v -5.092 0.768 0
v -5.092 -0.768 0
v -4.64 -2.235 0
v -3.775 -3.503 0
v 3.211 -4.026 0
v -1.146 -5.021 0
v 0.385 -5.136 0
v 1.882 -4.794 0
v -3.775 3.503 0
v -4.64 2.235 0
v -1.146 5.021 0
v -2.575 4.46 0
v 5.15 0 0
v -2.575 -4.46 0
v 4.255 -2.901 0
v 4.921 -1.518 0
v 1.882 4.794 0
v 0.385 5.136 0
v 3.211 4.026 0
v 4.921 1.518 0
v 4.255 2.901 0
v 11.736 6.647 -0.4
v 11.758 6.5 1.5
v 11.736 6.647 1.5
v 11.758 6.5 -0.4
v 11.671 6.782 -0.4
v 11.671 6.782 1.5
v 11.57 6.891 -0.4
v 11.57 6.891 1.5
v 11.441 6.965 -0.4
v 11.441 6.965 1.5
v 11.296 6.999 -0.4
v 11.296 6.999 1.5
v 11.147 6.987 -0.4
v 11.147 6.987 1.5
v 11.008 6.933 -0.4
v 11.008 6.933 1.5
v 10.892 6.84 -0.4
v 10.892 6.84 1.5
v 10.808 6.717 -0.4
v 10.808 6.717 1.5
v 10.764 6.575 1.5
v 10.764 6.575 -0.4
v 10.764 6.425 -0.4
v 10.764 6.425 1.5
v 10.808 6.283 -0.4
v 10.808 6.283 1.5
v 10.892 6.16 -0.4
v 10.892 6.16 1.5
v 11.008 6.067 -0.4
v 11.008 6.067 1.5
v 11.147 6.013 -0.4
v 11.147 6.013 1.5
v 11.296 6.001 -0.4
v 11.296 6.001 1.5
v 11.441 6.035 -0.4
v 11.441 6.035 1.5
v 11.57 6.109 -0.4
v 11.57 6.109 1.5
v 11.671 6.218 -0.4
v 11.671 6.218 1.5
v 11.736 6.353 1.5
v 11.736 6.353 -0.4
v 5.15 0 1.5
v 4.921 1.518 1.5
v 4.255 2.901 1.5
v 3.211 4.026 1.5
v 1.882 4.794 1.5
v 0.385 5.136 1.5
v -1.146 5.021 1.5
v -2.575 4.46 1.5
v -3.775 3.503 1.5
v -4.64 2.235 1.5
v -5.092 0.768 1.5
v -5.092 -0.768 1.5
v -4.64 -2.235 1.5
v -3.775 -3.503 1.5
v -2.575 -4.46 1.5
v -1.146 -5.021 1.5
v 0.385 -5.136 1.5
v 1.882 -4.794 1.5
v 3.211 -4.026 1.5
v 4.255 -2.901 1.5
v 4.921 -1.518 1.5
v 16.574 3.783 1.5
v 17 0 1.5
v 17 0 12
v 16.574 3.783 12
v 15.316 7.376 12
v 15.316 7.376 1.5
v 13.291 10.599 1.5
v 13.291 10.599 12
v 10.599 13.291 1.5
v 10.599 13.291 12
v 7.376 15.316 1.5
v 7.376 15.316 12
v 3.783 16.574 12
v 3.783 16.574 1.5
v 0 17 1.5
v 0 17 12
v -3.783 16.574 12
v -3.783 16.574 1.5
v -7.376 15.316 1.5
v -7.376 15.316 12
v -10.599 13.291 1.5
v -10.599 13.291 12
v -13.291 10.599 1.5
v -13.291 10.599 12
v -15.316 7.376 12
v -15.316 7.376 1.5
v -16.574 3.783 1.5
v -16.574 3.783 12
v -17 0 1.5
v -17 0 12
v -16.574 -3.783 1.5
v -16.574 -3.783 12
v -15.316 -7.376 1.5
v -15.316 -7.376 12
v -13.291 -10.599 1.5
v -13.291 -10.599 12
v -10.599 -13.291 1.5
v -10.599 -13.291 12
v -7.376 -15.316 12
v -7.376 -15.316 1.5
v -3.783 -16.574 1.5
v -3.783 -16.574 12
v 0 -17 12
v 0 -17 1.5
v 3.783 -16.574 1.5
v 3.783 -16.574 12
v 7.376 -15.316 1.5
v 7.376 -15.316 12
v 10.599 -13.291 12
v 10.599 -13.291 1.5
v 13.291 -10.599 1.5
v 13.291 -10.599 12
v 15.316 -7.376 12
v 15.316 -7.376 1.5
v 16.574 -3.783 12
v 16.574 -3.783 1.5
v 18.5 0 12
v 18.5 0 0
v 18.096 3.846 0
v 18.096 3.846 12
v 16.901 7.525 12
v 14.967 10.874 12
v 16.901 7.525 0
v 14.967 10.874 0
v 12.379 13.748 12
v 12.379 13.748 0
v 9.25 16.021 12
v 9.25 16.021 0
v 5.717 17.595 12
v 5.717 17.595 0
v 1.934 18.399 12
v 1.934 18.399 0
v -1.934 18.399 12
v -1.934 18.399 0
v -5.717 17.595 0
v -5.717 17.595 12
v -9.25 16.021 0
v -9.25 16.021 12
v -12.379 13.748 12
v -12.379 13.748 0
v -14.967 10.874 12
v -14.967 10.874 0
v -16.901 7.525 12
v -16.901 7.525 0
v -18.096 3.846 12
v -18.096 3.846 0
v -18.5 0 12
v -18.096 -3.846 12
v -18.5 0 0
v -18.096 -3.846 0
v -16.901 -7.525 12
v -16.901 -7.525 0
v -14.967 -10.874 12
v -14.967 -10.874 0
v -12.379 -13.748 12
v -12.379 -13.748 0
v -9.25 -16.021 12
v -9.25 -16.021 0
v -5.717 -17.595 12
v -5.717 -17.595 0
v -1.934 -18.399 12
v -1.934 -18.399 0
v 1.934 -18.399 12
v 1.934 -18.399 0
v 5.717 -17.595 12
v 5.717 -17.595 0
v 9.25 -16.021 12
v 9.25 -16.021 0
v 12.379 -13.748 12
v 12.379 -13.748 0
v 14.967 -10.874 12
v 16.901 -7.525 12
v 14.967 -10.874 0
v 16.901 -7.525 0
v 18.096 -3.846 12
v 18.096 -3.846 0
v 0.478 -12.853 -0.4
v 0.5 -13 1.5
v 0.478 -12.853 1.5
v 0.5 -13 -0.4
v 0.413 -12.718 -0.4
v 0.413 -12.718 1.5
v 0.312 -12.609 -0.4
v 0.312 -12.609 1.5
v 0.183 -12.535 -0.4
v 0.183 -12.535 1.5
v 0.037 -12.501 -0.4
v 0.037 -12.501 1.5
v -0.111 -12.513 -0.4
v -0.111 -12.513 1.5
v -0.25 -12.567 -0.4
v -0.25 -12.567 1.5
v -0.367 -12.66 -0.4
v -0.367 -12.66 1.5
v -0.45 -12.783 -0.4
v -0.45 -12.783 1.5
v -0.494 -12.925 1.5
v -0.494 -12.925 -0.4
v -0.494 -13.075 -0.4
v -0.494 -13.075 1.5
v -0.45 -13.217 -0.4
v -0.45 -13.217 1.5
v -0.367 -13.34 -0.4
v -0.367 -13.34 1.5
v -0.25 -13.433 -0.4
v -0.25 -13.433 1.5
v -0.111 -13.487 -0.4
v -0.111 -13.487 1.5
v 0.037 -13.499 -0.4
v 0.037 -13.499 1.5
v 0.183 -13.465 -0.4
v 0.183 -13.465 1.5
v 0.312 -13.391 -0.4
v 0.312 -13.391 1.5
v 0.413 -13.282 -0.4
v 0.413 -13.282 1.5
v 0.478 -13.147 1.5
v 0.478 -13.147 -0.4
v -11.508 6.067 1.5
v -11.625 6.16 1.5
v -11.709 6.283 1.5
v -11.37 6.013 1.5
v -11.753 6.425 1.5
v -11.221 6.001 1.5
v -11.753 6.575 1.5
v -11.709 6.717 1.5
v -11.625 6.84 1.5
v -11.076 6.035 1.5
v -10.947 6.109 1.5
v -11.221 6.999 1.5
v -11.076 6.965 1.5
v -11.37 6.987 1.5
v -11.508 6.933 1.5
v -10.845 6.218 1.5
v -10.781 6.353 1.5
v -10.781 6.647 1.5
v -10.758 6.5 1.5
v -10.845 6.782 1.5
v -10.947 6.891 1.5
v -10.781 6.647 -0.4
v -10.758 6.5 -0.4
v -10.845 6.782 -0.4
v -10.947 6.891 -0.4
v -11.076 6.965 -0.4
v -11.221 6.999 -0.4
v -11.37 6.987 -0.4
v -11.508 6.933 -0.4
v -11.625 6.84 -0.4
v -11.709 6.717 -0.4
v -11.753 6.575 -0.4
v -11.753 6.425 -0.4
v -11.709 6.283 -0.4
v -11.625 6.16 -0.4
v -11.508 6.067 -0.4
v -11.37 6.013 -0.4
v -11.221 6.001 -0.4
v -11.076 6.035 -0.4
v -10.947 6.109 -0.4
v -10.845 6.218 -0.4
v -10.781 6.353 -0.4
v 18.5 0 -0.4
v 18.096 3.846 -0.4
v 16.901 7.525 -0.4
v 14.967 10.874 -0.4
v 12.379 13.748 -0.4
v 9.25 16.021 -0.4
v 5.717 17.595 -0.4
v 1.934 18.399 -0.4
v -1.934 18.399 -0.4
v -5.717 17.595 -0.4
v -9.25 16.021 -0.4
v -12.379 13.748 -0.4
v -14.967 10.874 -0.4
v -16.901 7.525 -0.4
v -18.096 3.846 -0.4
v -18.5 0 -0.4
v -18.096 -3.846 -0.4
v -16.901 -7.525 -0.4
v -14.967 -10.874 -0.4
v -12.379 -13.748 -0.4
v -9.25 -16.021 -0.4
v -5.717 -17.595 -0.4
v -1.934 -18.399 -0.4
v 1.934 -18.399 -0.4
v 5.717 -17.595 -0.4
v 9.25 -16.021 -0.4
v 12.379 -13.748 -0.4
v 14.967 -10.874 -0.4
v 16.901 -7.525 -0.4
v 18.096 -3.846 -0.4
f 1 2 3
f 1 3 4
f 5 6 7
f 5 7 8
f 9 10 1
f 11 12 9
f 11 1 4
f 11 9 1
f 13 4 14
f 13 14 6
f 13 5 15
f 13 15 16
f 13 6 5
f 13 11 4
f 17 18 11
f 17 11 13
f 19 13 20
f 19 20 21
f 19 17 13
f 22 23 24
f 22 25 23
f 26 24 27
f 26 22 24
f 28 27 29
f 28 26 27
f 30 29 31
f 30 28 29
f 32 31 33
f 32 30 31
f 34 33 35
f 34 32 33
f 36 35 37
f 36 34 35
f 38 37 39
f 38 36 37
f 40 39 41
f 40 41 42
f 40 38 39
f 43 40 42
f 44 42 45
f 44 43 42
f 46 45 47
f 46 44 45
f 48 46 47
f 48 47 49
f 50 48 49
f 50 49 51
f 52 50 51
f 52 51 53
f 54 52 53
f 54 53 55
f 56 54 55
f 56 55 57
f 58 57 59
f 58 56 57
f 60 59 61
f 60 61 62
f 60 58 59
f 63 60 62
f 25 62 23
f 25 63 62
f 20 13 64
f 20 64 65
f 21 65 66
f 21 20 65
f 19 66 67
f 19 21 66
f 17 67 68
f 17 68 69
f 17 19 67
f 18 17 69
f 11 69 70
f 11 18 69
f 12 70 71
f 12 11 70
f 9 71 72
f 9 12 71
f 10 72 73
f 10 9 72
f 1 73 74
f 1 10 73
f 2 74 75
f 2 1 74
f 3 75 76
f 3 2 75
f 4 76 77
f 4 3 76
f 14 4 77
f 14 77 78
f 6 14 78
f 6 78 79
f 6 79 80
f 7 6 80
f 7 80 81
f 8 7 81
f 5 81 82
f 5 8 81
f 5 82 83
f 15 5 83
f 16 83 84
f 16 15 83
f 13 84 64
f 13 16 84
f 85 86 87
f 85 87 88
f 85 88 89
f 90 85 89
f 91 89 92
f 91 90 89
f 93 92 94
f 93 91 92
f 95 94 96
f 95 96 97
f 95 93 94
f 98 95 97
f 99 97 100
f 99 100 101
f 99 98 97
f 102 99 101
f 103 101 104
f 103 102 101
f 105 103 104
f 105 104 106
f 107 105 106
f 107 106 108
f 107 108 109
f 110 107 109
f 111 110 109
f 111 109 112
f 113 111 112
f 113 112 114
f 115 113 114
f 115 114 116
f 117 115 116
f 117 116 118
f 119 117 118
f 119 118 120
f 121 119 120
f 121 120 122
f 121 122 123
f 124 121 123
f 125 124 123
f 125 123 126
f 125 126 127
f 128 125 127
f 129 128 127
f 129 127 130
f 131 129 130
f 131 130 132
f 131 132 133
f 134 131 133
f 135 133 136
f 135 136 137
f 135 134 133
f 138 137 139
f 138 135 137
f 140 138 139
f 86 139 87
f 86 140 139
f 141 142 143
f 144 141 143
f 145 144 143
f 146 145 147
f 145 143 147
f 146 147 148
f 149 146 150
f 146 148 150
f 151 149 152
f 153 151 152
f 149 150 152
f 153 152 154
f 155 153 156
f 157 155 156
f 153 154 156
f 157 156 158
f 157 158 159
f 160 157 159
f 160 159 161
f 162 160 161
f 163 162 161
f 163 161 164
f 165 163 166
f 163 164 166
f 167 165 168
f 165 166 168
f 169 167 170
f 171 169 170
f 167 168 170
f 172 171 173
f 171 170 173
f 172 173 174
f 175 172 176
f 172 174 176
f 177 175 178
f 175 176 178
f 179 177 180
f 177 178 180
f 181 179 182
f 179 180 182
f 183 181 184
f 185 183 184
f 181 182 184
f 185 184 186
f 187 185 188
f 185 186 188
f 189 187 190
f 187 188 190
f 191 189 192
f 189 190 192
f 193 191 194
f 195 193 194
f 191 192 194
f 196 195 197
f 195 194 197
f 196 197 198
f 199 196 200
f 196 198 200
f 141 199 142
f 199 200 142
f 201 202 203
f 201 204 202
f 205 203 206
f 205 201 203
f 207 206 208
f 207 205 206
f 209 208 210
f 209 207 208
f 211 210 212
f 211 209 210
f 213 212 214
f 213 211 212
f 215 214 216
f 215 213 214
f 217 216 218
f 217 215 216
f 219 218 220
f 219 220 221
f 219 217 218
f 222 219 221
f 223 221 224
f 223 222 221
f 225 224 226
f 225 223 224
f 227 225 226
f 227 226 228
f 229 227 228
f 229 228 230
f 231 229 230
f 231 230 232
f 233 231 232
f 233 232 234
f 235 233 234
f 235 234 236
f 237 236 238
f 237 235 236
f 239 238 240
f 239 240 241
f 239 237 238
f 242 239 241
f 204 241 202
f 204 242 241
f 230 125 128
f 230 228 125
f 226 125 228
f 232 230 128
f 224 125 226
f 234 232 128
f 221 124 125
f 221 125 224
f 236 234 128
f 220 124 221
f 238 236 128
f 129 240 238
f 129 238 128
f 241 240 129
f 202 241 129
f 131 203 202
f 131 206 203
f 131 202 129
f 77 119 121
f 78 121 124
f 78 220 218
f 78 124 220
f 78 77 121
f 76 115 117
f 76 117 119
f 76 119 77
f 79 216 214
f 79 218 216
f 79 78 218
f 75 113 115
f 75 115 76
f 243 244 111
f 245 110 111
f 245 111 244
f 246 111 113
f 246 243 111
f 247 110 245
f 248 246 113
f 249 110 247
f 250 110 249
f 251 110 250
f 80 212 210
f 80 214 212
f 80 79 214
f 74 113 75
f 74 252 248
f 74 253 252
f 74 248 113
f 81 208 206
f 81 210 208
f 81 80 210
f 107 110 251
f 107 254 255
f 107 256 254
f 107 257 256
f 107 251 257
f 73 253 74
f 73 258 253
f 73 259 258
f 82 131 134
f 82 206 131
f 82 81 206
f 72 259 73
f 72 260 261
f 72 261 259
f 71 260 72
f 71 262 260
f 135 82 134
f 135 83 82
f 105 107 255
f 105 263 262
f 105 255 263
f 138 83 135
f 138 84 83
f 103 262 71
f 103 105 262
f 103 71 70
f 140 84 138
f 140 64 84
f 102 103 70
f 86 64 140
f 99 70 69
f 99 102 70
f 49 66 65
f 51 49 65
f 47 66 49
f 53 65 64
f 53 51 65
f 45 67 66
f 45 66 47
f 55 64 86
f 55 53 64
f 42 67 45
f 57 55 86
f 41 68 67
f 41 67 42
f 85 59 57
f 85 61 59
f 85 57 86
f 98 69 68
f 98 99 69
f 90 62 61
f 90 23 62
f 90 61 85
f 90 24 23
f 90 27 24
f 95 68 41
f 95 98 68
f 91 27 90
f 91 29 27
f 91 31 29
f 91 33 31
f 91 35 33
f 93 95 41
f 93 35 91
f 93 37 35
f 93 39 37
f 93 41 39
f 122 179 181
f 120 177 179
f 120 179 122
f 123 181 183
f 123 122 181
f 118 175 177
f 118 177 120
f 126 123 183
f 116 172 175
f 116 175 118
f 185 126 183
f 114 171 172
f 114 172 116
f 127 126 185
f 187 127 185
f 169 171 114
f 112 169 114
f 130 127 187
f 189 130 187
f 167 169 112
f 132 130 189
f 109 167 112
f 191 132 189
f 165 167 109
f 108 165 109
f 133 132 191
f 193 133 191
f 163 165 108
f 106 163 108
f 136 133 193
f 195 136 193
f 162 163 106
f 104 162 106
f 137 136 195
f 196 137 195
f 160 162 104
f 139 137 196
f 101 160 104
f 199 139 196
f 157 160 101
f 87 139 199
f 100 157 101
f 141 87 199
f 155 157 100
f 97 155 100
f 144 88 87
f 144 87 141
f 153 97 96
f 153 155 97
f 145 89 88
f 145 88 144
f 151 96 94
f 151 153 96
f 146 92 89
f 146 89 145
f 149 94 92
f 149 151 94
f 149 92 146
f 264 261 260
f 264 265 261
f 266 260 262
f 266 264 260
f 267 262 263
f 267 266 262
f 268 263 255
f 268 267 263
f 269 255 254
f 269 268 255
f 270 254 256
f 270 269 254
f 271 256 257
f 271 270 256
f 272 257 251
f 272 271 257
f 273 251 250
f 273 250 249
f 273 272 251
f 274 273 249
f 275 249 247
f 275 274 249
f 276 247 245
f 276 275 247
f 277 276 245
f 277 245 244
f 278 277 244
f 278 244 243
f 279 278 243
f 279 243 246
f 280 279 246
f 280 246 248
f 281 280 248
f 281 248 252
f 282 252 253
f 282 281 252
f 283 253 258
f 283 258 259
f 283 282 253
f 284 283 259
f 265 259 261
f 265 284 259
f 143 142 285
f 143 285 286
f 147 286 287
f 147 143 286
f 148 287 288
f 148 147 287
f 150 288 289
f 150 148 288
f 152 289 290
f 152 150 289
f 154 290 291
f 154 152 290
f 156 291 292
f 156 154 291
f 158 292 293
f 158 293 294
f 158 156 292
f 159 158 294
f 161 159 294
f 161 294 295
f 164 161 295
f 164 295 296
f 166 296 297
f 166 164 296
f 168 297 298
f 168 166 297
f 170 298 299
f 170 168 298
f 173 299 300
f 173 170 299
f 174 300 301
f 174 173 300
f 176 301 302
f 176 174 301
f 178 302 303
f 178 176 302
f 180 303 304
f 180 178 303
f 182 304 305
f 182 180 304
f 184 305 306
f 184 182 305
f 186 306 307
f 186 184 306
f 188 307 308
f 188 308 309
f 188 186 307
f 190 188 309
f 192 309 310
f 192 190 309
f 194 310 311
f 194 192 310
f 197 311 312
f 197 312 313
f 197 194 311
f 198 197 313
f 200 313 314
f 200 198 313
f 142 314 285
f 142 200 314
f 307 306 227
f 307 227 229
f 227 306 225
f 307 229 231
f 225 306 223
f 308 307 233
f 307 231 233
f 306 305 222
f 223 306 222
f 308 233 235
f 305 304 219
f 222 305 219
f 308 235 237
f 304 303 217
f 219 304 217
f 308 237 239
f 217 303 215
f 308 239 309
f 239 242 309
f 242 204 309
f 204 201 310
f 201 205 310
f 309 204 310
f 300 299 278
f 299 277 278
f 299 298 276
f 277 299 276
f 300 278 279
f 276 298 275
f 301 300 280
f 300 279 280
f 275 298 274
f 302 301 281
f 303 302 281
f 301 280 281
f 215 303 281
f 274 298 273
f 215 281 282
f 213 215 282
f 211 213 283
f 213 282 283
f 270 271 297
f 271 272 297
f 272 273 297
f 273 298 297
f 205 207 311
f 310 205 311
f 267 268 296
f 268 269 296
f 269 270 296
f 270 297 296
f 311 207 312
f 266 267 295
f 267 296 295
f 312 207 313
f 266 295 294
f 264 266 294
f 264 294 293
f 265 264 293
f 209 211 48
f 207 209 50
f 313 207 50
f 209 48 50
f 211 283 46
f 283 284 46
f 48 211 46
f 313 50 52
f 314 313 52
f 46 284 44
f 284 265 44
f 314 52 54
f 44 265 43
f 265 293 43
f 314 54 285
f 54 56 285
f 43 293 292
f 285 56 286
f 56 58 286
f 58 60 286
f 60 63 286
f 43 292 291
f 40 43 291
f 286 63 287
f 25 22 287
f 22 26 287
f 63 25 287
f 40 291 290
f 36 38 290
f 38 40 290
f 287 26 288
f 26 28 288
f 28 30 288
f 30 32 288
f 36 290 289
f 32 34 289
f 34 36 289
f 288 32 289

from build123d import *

# Parameters (mm, degrees)
F2_R     = 18.5
F2_R_2   = 17
F2_R_3   = 5.15
F2_R_4   = 0.5
F3_DEPTH = 0.4
F4_DEPTH = 1.5
F5_DEPTH = 12


with BuildPart() as f3:
    # F2 (on Top) → F3 (new body)
    with BuildSketch(Plane.XY):
        Circle(F2_R)
        Circle(F2_R_2, mode=Mode.SUBTRACT)
        Circle(F2_R_2)
        with Locations((0, -11)):
            Circle(F2_R_3, mode=Mode.SUBTRACT)
        with Locations((-11.2583302492, 6.5)):
            Circle(F2_R_4, mode=Mode.SUBTRACT)
        Circle(F2_R_3, mode=Mode.SUBTRACT)
        with Locations((11.2583302492, 6.5)):
            Circle(F2_R_4, mode=Mode.SUBTRACT)
        with Locations((0, 11)):
            Circle(F2_R_3, mode=Mode.SUBTRACT)
        with Locations((0, -11)):
            Circle(F2_R_3)
        with Locations((0, -13)):
            Circle(F2_R_4, mode=Mode.SUBTRACT)
        Circle(F2_R_3)
        with Locations((0, 11)):
            Circle(F2_R_3)
    extrude(amount=-F3_DEPTH)

    # F2 (on Top) → F4 (join)
    with BuildSketch(Plane.XY):
        Circle(F2_R_2)
        with Locations((0, -11)):
            Circle(F2_R_3, mode=Mode.SUBTRACT)
        with Locations((-11.2583302492, 6.5)):
            Circle(F2_R_4, mode=Mode.SUBTRACT)
        Circle(F2_R_3, mode=Mode.SUBTRACT)
        with Locations((11.2583302492, 6.5)):
            Circle(F2_R_4, mode=Mode.SUBTRACT)
        with Locations((0, 11)):
            Circle(F2_R_3, mode=Mode.SUBTRACT)
        with Locations((0, 11)):
            Circle(F2_R_3)
        with Locations((0, -11)):
            Circle(F2_R_3)
        with Locations((0, -13)):
            Circle(F2_R_4, mode=Mode.SUBTRACT)
    extrude(amount=F4_DEPTH)

    # F2 (on Top) → F5 (join)
    with BuildSketch(Plane.XY):
        Circle(F2_R)
        Circle(F2_R_2, mode=Mode.SUBTRACT)
    extrude(amount=F5_DEPTH)


solid = f3.part
